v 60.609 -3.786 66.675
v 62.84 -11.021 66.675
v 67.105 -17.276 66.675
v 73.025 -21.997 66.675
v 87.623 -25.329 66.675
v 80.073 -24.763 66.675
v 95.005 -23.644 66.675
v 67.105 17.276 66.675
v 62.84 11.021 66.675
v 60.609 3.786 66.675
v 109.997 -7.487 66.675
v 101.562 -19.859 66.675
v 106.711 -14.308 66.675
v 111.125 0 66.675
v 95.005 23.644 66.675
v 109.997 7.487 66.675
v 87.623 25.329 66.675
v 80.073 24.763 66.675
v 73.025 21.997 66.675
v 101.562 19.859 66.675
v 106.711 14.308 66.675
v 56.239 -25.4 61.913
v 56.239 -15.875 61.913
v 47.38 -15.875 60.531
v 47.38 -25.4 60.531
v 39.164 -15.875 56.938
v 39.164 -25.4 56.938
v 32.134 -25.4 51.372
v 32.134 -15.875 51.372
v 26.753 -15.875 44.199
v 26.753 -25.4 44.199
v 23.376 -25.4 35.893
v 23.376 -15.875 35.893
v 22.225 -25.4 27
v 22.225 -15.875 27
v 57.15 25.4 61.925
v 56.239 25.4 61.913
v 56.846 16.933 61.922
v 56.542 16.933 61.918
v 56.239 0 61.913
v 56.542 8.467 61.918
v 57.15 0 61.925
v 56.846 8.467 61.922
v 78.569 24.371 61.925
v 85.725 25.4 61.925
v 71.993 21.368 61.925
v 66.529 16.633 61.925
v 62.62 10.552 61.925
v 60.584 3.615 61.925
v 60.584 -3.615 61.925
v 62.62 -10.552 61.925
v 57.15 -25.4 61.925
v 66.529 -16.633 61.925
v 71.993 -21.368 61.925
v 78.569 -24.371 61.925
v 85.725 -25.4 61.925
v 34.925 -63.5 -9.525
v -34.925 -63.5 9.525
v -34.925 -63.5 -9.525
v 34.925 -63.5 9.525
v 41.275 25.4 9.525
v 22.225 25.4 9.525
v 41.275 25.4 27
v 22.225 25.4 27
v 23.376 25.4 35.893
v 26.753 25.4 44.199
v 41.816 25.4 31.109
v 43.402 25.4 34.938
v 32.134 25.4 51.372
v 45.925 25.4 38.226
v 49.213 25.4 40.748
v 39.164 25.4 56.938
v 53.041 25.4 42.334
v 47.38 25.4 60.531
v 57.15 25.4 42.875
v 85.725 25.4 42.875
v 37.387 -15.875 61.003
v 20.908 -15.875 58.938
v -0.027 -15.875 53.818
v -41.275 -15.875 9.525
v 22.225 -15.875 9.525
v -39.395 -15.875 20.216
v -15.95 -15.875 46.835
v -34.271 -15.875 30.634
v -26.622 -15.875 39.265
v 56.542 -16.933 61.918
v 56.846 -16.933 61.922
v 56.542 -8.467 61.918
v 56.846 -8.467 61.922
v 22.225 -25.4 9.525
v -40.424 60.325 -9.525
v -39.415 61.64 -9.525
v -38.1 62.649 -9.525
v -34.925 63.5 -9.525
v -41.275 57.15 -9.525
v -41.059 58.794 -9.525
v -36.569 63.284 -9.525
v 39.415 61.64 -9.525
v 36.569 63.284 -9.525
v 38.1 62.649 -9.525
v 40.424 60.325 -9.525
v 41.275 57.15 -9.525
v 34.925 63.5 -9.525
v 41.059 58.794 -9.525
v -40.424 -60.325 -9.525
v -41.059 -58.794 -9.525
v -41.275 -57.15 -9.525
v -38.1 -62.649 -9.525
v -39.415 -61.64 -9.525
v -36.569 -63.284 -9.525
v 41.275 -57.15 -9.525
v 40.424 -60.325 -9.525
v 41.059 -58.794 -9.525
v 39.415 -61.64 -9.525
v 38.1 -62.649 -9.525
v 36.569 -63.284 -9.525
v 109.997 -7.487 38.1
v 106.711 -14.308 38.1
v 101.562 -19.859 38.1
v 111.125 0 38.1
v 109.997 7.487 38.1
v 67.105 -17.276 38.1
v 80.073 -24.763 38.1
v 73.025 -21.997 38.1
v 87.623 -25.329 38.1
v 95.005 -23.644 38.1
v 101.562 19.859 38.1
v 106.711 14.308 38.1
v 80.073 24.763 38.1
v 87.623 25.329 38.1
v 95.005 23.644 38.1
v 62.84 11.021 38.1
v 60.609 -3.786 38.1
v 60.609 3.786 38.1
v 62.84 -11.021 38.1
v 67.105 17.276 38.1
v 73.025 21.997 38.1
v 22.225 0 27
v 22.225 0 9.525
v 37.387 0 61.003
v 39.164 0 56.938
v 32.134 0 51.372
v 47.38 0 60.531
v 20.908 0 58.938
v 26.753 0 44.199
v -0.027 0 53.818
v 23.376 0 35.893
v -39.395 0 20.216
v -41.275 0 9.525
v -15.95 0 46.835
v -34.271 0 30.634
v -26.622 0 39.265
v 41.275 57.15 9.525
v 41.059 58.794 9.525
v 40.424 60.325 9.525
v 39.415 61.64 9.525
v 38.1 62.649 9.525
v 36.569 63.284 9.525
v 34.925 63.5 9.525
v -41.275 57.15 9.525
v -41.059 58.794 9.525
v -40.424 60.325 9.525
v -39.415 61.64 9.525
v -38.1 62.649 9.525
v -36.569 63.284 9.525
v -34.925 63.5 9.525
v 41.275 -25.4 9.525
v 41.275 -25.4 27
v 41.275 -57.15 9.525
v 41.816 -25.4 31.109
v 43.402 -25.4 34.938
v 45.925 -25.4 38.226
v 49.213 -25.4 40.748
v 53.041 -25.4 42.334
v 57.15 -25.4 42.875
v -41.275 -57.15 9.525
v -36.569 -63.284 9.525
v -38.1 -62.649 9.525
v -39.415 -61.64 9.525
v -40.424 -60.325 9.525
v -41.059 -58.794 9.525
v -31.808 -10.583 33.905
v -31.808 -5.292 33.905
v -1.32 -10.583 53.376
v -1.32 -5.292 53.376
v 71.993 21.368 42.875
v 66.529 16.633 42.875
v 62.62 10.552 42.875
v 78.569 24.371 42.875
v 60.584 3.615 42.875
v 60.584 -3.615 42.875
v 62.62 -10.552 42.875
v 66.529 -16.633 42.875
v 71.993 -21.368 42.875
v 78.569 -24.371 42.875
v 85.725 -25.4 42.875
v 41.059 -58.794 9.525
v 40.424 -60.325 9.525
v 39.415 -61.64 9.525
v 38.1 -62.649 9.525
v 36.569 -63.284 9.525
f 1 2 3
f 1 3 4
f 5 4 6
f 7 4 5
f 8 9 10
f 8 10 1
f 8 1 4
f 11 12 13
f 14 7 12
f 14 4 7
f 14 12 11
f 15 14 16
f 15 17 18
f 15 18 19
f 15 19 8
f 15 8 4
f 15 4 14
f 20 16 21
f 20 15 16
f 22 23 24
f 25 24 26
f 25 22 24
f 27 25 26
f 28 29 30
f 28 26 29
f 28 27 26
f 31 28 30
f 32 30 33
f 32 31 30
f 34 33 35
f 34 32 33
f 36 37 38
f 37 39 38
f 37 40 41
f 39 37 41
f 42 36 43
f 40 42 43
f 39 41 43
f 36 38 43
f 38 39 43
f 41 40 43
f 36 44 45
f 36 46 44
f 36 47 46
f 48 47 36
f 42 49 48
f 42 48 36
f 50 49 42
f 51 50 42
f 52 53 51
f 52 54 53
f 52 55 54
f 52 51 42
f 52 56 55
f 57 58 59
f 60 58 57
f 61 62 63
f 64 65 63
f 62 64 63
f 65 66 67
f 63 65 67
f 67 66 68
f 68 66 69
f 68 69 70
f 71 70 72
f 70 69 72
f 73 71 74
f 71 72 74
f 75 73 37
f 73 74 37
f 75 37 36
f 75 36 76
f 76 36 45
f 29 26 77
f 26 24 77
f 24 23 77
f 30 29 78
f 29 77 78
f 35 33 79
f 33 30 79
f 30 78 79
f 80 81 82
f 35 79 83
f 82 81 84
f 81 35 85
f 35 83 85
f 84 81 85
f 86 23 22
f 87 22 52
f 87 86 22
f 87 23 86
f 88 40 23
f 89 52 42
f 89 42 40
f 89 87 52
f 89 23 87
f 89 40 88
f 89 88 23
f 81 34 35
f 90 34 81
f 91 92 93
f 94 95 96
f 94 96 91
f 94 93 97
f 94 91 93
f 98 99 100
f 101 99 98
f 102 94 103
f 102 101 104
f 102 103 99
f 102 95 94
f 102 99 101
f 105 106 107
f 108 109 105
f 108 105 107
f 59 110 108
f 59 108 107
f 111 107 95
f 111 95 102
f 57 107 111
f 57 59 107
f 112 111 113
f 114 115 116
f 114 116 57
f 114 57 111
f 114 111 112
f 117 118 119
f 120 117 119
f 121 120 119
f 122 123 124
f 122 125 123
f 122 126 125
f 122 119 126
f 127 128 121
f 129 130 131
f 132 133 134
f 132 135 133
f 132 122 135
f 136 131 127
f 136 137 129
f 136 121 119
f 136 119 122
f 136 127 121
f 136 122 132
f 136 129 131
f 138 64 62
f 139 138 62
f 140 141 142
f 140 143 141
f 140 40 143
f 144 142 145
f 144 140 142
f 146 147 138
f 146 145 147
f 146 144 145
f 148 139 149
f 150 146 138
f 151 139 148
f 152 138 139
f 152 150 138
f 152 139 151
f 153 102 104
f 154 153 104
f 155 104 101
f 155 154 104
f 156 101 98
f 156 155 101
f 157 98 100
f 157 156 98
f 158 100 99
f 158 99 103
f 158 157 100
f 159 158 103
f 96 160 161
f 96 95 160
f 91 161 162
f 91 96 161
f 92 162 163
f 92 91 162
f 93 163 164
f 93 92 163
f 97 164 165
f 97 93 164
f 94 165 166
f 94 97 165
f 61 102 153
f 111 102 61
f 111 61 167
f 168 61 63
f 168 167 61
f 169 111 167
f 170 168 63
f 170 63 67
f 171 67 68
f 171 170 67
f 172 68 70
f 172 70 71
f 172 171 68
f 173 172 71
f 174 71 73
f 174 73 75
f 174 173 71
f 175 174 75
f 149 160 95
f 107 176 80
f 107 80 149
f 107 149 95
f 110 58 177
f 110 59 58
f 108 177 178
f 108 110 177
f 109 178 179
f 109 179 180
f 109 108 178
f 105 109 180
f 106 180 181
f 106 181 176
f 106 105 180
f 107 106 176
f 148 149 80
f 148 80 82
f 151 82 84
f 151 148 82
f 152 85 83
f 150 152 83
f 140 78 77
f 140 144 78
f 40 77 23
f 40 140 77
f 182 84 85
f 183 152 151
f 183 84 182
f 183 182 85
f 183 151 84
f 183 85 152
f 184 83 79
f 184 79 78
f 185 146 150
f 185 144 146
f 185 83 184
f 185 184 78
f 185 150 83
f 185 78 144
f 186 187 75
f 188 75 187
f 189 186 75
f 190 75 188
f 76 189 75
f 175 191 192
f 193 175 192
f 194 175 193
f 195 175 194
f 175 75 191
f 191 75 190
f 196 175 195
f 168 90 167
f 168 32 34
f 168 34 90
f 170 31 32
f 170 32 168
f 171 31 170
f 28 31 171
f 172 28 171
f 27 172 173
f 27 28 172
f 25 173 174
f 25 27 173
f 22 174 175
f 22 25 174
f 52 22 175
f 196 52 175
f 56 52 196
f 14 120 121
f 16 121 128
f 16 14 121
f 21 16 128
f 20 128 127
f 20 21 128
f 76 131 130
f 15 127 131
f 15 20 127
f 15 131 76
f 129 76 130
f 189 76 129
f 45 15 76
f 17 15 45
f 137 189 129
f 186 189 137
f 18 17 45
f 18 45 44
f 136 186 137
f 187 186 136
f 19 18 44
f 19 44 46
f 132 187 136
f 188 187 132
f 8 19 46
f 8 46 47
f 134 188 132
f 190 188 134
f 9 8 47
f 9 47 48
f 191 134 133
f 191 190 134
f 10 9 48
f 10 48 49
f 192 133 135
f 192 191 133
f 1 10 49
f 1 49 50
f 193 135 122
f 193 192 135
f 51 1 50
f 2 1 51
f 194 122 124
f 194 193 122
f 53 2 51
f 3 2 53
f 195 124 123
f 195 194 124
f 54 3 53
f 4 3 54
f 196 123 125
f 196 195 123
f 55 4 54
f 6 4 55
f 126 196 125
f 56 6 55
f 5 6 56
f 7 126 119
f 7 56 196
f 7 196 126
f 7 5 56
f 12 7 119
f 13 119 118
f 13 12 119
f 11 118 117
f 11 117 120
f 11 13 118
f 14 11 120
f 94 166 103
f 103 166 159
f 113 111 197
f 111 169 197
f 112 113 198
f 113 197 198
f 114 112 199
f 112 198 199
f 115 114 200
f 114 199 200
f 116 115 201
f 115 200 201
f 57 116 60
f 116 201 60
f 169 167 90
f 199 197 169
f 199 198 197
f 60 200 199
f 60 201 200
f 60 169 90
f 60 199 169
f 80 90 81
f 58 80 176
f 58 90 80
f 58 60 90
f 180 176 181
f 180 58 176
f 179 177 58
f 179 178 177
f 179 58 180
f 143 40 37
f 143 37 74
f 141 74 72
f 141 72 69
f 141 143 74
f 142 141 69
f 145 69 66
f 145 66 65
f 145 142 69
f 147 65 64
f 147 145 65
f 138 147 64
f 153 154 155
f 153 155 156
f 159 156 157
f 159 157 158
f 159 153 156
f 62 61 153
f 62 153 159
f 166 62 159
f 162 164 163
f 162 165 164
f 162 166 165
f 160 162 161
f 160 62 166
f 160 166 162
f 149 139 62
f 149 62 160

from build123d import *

# Parameters (mm, degrees)
F1_DEPTH = 63.5
F0_W     = 25.4
F0_H     = 19.05
F2_DEPTH = 25.4
F3_DEPTH = 15.875
F5_R     = 6.35


with BuildPart() as f1:
    # F0 (on Front) → F1 (new body, symmetric)
    with BuildSketch(Plane.XZ):
        Polygon((-41.275, 9.525), (-41.275, -9.525), (41.275, -9.525), (41.275, 9.525), (22.225, 9.525), align=None)
    extrude(amount=F1_DEPTH, both=True)

    # F0 (on Front) → F2 (join, symmetric)
    with BuildSketch(Plane.XZ):
        with BuildLine():
            Line((22.225, 9.525), (41.275, 9.525))
            Line((41.275, 9.525), (41.275, 27.0002))
            ThreePointArc((41.275, 27.0002), (45.9246798487, 38.2255201513), (57.15, 42.8752))
            Line((57.15, 42.8752), (60.325, 42.8752))
            Line((60.325, 42.8752), (60.325, 61.9252))
            Line((60.325, 61.9252), (57.15, 61.9252))
            add(Edge.make_bspline(
                [(56.2394540171, 61.9133283476), (56.5421172975, 61.9177221898), (56.8456319814, 61.9216800485), (57.15, 61.9252)],
                knots=[111.0448358966, 111.0448358966, 111.0448358966, 111.0448358966, 111.5045361635, 111.5045361635, 111.5045361635, 111.5045361635], degree=3))
            ThreePointArc((56.2394540171, 61.9133283476), (32.1344404075, 51.371851632), (22.225, 27.0002))
            Line((22.225, 27.0002), (22.225, 9.525))
        make_face()
        with Locations((73.025, 52.4002)):
            Rectangle(F0_W, F0_H)
    extrude(amount=F2_DEPTH, both=True)

    # F0 (on Front) → F3 (join)
    with BuildSketch(Plane.XZ):
        with BuildLine():
            add(Edge.make_bspline(
                [(-41.275, 9.525), (-40.3026354638, 34.3505741686), (-16.871650594, 60.8519552711), (56.2394540171, 61.9133283476)],
                knots=[0, 0, 0, 0, 111.0448358966, 111.0448358966, 111.0448358966, 111.0448358966], degree=3))
            Line((-41.275, 9.525), (22.225, 9.525))
            Line((22.225, 9.525), (22.225, 27.0002))
            ThreePointArc((22.225, 27.0002), (32.1344404075, 51.371851632), (56.2394540171, 61.9133283476))
        make_face()
    extrude(amount=F3_DEPTH)

    # F0 (on Front) → F4 (revolve)
    with BuildSketch(Plane.XZ):
        Polygon((85.725, 66.675), (85.725, 61.9252), (85.725, 42.8752), (85.725, 38.1), (111.125, 38.1), (111.125, 66.675), align=None)
    revolve(axis=Axis((85.725, 0, 52.3875), (0, 0, 1)))

    # F5
    f5_edges = [f1.edges().sort_by_distance(p)[0] for p in [
        (41.275, -63.5, 0),
        (-41.275, -63.5, 0),
        (41.275, 63.5, 0),
        (-41.275, 63.5, 0),
    ]]
    fillet(f5_edges, radius=F5_R)


solid = f1.part
